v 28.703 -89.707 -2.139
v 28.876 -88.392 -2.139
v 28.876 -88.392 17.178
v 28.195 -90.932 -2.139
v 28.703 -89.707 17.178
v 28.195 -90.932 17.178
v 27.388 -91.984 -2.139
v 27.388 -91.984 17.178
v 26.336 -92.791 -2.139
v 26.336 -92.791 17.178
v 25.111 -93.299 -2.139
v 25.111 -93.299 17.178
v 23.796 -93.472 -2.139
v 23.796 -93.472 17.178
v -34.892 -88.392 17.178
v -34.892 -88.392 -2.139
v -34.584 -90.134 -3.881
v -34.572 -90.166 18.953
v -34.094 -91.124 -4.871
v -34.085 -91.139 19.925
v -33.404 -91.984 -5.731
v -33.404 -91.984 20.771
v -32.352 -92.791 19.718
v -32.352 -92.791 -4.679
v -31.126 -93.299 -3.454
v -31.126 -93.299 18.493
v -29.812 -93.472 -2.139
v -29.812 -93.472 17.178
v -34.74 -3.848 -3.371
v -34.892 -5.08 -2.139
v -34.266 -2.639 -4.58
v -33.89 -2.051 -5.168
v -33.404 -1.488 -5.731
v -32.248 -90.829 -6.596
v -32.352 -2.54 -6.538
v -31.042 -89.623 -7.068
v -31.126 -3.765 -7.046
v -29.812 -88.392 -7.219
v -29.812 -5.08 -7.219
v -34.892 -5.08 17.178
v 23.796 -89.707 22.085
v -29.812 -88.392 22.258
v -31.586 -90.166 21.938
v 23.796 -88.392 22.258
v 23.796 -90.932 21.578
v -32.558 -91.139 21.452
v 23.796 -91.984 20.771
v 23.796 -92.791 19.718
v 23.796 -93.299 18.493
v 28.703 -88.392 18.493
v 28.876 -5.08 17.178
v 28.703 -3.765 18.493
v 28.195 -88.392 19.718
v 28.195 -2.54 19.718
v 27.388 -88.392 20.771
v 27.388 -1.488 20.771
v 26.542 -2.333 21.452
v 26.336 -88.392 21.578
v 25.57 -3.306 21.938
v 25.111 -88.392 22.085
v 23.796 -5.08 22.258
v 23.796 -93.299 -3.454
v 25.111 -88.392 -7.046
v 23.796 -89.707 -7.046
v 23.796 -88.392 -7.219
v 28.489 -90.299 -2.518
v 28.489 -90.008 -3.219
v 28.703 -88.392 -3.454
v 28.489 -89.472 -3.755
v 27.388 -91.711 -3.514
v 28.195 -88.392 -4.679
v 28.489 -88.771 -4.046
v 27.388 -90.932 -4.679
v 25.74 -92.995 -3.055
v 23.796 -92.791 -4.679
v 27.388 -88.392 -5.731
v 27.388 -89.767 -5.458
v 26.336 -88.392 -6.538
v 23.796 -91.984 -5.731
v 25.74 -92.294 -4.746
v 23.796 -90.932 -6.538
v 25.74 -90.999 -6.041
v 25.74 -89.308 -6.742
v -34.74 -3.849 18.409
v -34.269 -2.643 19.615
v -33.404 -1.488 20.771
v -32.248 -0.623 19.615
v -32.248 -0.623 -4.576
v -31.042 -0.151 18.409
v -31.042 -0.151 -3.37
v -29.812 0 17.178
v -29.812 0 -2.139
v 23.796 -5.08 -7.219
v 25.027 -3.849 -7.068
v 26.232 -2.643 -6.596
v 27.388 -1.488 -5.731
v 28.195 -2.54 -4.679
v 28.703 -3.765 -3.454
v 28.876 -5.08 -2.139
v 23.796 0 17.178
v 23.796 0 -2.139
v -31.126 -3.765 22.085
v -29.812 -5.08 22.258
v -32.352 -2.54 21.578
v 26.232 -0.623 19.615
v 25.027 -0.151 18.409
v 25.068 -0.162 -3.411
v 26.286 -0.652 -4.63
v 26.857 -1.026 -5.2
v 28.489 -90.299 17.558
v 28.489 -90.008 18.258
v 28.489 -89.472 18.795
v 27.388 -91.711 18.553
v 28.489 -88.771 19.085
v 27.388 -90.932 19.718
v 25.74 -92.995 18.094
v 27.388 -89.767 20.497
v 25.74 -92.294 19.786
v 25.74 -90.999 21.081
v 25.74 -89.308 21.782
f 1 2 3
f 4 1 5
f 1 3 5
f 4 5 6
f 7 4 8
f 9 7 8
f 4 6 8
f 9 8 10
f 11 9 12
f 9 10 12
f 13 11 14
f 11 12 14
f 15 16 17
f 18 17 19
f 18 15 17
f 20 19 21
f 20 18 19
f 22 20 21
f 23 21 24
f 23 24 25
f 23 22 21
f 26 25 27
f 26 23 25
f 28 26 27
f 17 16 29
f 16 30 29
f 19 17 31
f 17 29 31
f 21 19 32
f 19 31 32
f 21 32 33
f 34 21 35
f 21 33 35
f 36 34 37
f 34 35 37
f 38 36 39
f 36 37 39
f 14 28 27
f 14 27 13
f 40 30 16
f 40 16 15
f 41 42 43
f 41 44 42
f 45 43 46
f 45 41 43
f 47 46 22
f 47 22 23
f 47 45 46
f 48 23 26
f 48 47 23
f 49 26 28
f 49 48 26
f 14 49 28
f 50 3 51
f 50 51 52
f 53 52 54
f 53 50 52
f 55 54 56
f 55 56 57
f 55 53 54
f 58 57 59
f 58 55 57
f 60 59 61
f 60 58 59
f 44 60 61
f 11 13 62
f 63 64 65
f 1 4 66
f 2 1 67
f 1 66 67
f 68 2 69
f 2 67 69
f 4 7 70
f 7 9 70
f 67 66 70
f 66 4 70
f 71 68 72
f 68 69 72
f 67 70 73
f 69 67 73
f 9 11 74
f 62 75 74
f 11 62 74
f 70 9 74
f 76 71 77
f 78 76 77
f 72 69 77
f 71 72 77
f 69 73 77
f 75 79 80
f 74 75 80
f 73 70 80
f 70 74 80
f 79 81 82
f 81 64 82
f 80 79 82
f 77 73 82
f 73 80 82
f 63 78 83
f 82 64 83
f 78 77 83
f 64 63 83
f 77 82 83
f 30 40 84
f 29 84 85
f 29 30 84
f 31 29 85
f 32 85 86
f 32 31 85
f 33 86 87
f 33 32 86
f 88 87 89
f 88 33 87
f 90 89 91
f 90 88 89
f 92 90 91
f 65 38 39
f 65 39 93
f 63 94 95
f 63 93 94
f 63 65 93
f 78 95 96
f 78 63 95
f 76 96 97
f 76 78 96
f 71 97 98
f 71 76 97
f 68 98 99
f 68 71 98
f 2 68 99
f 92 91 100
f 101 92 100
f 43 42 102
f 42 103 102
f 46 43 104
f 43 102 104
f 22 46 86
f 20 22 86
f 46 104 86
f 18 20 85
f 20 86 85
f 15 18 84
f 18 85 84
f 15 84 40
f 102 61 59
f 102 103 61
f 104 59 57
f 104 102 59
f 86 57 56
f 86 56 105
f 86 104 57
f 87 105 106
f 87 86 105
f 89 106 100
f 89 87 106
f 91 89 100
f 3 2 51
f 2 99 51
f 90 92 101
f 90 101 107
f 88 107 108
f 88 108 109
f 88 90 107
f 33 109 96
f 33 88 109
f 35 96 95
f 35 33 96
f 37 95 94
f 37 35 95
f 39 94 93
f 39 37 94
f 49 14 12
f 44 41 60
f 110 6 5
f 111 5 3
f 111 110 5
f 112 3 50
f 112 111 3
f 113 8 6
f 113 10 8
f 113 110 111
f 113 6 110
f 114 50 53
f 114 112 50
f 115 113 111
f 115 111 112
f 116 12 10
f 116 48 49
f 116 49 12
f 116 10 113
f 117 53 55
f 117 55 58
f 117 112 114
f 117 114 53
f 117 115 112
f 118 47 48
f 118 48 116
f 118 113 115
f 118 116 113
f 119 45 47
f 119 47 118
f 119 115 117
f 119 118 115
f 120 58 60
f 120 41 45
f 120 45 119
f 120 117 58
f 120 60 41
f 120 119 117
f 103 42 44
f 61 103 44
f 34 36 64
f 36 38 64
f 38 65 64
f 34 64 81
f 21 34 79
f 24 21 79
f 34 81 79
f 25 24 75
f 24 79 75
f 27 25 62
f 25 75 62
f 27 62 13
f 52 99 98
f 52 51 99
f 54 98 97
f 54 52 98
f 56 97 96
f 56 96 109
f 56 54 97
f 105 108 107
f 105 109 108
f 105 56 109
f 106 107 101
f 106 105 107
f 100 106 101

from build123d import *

# Parameters (mm, degrees)
F0_W        = 63.7673679739
F0_H        = 29.4773685746
F1_DEPTH    = 93.472
F2_R        = 5.08
F3_T1_DEPTH = 113.792
F3_T3_DEPTH = 54.8773685746
F4_T1_DEPTH = 79.007367974


# Not quite as in the source:
# - a fillet or chamfer that OpenCascade refuses, or shapes differently, is made with other operations: its cross-section is extruded or revolved along the edge and cut away or added
# - the program builds the solid bodies; features that only make, move or delete a surface that nothing else refers to are left out


with BuildPart() as f1:
    # F0 (on Front) → F1 (new body)
    with BuildSketch(Plane.XZ):
        with Locations((-3.0078953132, 7.5197371189)):
            Rectangle(F0_W, F0_H)
    extrude(amount=F1_DEPTH)

    # F2
    f2_edges = [f1.edges().sort_by_distance(p)[0] for p in [
        (-3.007895, -93.472, 22.258421),
        (-34.891579, -93.472, 7.519737),
        (-3.007895, -93.472, -7.218947),
        (28.875789, -93.472, 7.519737),
        (28.875789, -46.736, -7.218947),
        (28.875789, -46.736, 22.258421),
        (28.875789, 0, 7.519737),
    ]]
    fillet(f2_edges, radius=F2_R)

    # F3: fillet of radius 5.08 on 4 edges, made by hand

    # F3_s2 → F3_t1 (cut)
    with BuildSketch(Plane.XZ.offset(-12.7)):
        with BuildLine():
            ThreePointArc((-29.8115793002, 22.2584214061), (-33.4036817486, 20.7705238546), (-34.8915793002, 17.1784214061))
            Line((-34.8915793002, 17.1784214061), (-34.8915793002, 22.2584214061))
            Line((-34.8915793002, 22.2584214061), (-29.8115793002, 22.2584214061))
        make_face()
        with BuildLine():
            ThreePointArc((-34.8915793002, -2.1389471684), (-33.4036817486, -5.7310496169), (-29.8115793002, -7.2189471684))
            Line((-29.8115793002, -7.2189471684), (-34.8915793002, -7.2189471684))
            Line((-34.8915793002, -7.2189471684), (-34.8915793002, -2.1389471684))
        make_face()
    extrude(amount=F3_T1_DEPTH, mode=Mode.SUBTRACT)

    # F3_s4 → F3_t3 (cut)
    with BuildSketch(Plane.XY.offset(-19.9189471684)):
        with BuildLine():
            ThreePointArc((-34.8915793002, -5.08), (-33.4036817486, -1.4878975516), (-29.8115793002, 0))
            Line((-29.8115793002, 0), (-34.8915793002, 0))
            Line((-34.8915793002, 0), (-34.8915793002, -5.08))
        make_face()
    extrude(amount=F3_T3_DEPTH, mode=Mode.SUBTRACT)

    # F4: fillet of radius 5.08 on 4 edges, made by hand

    # F4_s2 → F4_t1 (cut)
    with BuildSketch(Plane.YZ.offset(-42.5115793002)):
        with BuildLine():
            ThreePointArc((0, -2.1389471684), (-1.4878975516, -5.7310496169), (-5.08, -7.2189471684))
            Line((-5.08, -7.2189471684), (0, -7.2189471684))
            Line((0, -7.2189471684), (0, -2.1389471684))
        make_face()
        with BuildLine():
            ThreePointArc((-5.08, 22.2584214061), (-1.4878975516, 20.7705238546), (0, 17.1784214061))
            Line((0, 17.1784214061), (0, 22.2584214061))
            Line((0, 22.2584214061), (-5.08, 22.2584214061))
        make_face()
    extrude(amount=F4_T1_DEPTH, mode=Mode.SUBTRACT)


solid = f1.part
